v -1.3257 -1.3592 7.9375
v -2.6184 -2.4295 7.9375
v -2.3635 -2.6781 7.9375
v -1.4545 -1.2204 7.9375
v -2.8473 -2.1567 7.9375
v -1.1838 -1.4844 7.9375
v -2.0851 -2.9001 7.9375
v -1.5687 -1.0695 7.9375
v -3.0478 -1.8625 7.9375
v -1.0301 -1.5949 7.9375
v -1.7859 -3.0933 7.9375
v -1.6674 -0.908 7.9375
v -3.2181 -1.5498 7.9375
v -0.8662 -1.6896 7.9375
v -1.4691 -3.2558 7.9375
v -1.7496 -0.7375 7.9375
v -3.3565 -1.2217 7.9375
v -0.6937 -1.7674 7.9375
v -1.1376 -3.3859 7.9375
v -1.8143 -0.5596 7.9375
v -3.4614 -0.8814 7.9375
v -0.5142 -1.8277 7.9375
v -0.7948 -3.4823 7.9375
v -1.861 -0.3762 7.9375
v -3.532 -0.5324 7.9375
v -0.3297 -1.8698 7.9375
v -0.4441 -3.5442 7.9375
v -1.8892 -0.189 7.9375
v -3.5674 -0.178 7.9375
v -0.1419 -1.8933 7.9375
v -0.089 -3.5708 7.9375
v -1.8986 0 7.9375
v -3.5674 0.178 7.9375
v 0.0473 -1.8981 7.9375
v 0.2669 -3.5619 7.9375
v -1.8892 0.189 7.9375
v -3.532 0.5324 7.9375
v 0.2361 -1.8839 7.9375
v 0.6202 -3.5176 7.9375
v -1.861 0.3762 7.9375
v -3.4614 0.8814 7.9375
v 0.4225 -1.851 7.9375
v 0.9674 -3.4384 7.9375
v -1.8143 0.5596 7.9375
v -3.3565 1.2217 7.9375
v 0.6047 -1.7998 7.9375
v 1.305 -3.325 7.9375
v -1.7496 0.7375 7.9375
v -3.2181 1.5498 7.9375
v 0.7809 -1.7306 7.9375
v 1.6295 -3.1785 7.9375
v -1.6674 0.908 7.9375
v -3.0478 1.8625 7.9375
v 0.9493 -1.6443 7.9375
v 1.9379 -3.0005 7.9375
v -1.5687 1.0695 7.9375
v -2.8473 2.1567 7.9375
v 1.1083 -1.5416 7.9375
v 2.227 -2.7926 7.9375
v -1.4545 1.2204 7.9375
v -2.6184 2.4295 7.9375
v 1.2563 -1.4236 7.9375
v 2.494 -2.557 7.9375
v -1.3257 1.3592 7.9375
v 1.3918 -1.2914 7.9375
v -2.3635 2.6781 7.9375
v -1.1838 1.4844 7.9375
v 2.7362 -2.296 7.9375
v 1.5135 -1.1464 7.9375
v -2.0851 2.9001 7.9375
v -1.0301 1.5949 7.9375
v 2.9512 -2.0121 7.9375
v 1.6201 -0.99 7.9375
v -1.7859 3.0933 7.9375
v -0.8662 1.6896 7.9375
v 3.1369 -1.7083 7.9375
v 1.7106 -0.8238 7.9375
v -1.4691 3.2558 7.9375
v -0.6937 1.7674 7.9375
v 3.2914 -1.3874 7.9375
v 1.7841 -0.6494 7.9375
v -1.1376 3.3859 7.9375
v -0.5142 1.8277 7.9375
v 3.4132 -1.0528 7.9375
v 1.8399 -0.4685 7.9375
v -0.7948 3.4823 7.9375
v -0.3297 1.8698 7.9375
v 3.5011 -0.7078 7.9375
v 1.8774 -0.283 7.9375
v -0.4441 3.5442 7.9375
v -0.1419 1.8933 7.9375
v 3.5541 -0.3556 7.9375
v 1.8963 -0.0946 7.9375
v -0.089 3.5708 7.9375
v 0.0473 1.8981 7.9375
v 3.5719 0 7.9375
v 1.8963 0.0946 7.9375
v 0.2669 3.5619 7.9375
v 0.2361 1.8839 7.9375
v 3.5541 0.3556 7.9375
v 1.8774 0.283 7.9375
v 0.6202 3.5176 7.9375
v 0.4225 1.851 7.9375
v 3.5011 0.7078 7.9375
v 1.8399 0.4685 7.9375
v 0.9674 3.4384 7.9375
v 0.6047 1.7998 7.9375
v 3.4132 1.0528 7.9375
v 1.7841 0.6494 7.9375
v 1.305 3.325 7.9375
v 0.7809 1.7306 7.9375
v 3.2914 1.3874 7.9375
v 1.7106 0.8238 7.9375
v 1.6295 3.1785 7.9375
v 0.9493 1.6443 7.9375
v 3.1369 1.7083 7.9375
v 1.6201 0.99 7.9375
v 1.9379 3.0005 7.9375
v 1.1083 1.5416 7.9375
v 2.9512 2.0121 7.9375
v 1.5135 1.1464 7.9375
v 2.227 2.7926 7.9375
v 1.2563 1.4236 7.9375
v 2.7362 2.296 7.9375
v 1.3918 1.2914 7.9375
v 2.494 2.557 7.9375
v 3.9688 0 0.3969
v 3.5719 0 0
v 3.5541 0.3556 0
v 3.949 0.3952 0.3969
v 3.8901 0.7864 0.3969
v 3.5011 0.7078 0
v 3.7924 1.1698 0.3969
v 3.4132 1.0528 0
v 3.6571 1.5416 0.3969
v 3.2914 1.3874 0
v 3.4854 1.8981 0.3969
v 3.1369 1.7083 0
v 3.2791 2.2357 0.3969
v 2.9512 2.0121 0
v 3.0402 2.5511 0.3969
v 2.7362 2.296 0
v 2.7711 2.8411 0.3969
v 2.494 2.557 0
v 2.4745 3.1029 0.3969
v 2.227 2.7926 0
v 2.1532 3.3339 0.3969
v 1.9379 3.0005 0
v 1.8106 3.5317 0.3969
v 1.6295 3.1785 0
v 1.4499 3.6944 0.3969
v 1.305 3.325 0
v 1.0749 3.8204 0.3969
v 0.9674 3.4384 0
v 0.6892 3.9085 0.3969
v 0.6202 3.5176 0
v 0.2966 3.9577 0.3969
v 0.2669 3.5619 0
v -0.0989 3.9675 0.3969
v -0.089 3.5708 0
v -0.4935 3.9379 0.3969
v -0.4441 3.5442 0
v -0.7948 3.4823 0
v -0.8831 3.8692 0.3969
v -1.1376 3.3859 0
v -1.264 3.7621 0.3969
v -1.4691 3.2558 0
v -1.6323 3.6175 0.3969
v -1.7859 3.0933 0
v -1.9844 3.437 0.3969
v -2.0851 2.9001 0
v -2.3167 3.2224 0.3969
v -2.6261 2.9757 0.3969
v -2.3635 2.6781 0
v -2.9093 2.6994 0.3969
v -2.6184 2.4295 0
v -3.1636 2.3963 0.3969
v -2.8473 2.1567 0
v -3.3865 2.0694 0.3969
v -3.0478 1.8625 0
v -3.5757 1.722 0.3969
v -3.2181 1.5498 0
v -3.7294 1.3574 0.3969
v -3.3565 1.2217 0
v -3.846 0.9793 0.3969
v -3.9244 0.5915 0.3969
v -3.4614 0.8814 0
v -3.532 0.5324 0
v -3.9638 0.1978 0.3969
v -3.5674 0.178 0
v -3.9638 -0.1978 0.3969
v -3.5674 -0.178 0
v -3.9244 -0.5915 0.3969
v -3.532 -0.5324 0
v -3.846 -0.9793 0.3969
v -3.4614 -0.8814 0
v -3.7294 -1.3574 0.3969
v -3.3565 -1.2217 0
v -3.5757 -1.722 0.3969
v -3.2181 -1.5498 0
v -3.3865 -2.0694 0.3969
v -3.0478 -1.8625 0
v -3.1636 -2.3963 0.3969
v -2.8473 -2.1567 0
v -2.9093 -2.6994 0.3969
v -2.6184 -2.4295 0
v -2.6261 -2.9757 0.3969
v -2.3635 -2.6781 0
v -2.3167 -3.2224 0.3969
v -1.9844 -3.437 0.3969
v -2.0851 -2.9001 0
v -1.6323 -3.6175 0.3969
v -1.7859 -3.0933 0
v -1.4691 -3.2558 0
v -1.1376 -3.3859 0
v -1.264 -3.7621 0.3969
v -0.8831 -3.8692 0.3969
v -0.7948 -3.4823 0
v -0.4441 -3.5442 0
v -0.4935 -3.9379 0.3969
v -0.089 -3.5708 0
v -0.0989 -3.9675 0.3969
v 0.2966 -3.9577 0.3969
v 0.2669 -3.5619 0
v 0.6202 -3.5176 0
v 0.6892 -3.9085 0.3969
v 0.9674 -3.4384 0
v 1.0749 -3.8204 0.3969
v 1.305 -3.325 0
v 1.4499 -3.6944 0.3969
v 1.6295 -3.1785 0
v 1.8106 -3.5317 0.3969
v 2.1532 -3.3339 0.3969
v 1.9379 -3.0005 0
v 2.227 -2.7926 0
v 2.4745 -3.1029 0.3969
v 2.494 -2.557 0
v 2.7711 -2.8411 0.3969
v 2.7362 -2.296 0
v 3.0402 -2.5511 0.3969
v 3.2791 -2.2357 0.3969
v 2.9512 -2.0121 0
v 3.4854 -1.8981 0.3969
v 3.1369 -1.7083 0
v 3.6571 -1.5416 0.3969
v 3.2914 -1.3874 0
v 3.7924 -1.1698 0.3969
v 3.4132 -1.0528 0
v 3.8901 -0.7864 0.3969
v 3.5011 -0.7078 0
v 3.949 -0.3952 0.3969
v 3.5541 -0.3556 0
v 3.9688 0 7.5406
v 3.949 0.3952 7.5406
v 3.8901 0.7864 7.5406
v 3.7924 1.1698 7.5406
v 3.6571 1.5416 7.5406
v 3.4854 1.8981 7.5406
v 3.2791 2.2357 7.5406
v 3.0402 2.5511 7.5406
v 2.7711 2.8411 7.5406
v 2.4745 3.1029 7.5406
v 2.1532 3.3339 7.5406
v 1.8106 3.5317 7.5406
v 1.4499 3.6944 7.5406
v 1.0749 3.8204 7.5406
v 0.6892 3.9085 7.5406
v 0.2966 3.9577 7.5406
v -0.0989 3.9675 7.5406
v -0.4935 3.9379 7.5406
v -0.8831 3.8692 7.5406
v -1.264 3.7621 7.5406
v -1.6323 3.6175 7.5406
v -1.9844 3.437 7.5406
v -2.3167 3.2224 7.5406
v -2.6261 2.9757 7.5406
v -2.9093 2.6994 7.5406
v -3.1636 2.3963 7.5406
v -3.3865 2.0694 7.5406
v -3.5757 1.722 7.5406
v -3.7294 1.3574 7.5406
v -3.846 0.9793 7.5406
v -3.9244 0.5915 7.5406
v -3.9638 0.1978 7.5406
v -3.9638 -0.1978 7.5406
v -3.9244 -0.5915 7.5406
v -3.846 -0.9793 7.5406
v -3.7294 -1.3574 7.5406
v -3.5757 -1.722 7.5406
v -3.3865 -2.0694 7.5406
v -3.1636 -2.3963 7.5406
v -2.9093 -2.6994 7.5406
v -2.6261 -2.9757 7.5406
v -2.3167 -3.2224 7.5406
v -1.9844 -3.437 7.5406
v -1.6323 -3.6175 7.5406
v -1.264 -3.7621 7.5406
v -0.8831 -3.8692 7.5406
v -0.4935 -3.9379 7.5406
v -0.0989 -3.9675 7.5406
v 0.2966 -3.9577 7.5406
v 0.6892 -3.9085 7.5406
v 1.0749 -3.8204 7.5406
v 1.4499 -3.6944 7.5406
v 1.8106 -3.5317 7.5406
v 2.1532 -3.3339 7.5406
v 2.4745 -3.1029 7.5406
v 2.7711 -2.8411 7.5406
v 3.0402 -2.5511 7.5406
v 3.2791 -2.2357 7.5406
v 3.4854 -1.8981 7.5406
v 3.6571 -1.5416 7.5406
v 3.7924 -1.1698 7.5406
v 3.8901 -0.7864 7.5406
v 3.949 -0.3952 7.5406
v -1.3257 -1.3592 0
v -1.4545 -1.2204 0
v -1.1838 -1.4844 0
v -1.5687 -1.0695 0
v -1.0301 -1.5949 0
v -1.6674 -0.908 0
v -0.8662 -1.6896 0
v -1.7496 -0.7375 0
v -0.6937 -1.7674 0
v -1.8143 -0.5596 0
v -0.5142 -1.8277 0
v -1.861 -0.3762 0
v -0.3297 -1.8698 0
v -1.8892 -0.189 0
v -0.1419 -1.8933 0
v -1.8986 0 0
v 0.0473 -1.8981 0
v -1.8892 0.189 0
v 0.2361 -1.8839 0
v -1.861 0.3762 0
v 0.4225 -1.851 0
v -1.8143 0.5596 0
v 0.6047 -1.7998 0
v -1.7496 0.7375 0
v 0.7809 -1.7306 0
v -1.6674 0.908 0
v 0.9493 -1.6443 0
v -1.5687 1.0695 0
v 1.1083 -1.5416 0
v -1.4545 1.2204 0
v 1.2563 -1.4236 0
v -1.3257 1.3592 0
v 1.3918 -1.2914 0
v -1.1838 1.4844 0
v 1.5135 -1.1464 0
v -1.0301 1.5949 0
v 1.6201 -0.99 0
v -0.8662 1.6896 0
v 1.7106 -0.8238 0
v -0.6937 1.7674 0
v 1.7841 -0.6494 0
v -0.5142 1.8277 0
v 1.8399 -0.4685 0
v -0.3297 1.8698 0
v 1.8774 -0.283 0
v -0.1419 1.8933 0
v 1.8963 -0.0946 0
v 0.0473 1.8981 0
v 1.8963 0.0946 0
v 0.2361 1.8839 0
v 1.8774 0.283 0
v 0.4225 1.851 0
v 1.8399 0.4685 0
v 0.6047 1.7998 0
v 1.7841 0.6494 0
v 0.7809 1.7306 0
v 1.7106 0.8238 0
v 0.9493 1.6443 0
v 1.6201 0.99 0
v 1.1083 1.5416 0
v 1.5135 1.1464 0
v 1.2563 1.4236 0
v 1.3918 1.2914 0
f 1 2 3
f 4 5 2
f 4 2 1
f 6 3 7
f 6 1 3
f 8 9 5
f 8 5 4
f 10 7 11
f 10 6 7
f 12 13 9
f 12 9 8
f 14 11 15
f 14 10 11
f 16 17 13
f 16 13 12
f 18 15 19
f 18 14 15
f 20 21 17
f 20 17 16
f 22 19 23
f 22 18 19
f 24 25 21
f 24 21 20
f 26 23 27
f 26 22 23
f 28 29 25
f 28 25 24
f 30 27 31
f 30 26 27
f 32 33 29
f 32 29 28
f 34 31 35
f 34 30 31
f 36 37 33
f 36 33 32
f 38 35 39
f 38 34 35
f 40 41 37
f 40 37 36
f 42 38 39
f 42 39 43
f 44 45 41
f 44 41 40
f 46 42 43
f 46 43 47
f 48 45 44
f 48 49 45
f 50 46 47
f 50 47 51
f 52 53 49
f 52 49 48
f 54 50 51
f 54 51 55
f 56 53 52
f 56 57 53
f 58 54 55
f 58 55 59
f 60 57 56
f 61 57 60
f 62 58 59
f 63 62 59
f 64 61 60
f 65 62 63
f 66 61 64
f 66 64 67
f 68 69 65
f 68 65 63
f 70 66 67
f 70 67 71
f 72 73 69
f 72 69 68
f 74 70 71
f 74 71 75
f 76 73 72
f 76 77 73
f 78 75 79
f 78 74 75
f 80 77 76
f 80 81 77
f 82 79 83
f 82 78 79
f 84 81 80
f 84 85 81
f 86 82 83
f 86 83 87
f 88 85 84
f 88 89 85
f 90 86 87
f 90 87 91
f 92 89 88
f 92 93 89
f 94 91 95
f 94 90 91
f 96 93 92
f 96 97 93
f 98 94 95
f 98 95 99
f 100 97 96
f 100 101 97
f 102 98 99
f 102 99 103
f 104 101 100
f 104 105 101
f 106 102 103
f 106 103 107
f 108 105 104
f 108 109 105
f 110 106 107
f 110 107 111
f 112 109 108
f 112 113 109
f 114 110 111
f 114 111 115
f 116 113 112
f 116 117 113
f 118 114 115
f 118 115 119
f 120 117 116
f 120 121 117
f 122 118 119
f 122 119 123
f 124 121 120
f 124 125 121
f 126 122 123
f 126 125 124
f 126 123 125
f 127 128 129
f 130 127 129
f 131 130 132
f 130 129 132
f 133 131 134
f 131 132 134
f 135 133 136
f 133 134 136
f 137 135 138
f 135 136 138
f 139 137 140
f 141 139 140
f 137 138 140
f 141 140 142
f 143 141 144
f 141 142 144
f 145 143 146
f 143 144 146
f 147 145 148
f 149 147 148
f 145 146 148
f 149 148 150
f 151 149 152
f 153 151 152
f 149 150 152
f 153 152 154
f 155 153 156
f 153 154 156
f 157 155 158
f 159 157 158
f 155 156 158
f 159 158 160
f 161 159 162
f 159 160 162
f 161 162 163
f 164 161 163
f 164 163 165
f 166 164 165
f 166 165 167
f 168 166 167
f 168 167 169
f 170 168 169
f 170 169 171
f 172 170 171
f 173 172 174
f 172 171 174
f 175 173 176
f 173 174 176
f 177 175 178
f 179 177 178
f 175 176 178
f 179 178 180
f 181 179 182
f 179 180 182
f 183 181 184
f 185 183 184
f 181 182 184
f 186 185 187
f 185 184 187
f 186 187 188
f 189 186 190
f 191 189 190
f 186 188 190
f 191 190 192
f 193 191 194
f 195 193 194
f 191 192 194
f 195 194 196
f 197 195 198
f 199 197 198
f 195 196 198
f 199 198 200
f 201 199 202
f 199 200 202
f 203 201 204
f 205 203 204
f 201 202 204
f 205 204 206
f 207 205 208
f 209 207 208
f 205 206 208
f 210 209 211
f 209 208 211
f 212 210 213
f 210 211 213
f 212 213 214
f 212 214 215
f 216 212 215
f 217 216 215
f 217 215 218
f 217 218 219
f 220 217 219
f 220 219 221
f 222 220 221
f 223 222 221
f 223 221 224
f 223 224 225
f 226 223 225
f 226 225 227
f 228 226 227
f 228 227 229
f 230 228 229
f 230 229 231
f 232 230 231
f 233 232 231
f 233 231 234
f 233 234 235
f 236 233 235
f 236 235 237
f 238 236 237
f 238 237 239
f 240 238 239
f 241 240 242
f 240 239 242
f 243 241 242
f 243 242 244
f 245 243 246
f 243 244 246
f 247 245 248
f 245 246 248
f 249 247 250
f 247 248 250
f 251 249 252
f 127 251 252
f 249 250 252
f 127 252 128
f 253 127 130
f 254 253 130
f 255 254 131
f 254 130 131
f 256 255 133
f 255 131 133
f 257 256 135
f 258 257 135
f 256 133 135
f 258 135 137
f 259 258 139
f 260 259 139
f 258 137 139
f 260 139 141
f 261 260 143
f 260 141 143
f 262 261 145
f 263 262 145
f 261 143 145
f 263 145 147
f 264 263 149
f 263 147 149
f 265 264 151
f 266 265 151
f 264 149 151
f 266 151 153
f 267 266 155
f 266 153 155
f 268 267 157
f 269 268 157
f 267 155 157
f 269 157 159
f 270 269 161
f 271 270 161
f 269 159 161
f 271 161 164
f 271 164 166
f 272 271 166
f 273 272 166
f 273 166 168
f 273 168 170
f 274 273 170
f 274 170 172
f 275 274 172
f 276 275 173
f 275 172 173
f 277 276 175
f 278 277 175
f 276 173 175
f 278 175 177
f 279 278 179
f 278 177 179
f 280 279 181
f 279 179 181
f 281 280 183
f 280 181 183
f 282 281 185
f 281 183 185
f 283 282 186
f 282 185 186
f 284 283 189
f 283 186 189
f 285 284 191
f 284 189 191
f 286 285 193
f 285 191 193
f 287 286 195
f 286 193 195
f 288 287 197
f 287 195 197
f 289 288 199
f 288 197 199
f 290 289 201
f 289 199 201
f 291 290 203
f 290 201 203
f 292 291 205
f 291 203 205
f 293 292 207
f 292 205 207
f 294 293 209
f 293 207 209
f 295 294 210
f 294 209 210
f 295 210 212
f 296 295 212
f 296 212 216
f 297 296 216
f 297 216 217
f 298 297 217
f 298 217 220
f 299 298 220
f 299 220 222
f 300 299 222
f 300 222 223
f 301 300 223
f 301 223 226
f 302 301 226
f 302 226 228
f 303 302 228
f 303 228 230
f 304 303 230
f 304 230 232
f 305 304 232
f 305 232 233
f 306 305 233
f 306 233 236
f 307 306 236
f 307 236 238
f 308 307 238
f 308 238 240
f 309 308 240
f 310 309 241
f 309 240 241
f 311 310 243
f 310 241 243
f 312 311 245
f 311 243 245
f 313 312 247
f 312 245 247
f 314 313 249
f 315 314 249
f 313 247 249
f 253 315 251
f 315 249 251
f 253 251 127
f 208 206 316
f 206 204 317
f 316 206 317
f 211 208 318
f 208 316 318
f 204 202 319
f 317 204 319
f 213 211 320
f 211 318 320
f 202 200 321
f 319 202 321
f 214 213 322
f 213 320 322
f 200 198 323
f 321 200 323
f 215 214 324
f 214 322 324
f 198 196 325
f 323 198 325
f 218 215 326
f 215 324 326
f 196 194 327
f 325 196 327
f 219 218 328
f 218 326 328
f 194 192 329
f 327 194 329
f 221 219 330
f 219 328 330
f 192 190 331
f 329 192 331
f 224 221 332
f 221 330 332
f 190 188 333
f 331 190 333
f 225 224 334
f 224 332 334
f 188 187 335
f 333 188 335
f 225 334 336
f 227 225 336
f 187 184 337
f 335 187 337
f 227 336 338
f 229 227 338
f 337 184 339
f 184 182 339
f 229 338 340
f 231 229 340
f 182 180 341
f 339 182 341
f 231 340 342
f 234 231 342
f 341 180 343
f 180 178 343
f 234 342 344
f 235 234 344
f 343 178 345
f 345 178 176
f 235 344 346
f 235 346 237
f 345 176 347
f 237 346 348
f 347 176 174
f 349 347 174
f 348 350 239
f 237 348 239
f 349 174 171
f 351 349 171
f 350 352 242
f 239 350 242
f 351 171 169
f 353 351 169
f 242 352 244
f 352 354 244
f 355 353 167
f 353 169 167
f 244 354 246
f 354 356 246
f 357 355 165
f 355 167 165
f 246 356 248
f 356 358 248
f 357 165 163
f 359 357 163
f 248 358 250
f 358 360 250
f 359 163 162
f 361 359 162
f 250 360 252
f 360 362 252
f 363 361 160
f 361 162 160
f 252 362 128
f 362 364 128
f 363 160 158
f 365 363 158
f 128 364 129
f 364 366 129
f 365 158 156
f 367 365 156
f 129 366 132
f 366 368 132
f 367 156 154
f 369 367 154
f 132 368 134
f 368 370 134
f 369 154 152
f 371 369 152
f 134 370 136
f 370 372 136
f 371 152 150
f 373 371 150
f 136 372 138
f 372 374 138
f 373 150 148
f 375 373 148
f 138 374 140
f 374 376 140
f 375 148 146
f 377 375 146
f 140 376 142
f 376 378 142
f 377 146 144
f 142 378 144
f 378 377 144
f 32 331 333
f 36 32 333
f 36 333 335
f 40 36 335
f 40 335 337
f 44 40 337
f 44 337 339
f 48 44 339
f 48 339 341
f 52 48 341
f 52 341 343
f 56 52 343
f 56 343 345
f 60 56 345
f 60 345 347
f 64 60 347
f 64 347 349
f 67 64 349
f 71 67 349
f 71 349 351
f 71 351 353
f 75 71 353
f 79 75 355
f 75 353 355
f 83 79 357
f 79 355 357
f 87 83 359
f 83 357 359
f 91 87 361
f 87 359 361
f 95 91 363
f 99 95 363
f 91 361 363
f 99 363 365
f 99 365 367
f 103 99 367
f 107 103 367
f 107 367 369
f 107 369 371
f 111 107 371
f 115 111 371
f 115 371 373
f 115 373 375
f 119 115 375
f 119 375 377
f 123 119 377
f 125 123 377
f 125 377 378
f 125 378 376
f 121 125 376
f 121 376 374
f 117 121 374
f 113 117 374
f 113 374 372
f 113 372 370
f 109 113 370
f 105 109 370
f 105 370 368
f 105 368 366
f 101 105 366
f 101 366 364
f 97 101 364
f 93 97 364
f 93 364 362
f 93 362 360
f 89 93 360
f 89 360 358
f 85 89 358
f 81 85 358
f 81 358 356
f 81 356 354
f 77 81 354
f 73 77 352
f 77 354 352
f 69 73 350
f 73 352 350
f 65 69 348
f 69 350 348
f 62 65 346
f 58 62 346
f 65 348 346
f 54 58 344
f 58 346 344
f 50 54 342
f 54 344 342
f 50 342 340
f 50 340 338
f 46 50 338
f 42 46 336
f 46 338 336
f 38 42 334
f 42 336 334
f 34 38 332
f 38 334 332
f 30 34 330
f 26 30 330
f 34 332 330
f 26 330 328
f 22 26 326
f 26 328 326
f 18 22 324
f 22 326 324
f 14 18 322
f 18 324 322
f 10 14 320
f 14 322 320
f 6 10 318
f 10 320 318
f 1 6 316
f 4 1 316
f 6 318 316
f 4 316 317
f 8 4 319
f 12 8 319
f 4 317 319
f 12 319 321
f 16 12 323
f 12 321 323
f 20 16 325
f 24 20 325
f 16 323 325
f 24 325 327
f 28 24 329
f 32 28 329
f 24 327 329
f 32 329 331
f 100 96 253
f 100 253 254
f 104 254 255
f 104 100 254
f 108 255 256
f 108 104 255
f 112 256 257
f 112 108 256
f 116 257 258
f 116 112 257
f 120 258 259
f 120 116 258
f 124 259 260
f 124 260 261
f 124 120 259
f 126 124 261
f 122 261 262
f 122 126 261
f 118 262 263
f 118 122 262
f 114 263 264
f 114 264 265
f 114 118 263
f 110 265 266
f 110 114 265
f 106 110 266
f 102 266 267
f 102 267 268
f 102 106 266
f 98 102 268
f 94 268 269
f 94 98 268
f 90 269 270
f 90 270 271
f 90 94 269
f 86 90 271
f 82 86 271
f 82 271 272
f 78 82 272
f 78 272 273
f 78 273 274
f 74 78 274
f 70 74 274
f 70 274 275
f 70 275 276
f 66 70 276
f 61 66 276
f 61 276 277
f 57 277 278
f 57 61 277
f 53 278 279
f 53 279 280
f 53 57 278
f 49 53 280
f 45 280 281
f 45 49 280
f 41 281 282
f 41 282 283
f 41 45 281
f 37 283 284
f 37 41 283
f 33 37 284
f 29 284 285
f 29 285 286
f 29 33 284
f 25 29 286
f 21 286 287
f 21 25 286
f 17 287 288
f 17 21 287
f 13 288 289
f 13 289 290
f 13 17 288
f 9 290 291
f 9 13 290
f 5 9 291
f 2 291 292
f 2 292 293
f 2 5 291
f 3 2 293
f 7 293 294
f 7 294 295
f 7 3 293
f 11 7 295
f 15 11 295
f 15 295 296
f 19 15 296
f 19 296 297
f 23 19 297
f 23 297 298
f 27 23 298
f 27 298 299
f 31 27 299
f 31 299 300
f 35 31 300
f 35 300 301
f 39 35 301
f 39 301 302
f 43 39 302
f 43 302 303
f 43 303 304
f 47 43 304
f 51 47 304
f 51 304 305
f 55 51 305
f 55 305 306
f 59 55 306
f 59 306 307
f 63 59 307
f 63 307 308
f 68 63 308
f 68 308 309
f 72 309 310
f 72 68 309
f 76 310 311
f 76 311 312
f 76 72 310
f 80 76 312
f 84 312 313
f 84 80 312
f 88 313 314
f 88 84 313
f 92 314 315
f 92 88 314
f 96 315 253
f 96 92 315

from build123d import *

# Parameters (mm, degrees)
SKETCH1_R              = 3.96875
EXTRUDE1_DEPTH         = 7.9375
CHAMFER1_SIZE          = 0.396875
F_10_24_TAPPED_HOLE1_D = 3.7973


with BuildPart() as part:
    # Sketch1 → Extrude1 (new body)
    with BuildSketch(Plane.XY):
        Circle(SKETCH1_R)
    extrude(amount=EXTRUDE1_DEPTH)

    # Chamfer1
    chamfer1_edges = [part.edges().sort_by_distance(p)[0] for p in [
        (-3.96875, 0, 0),
        (-3.96875, 0, 7.9375),
    ]]
    chamfer(chamfer1_edges, length=CHAMFER1_SIZE)

    # #10-24 Tapped Hole1 (through all)
    with Locations(Plane.XY.offset(7.9375)):
        with Locations((0, 0)):
            Hole(F_10_24_TAPPED_HOLE1_D / 2)


solid = part.part
